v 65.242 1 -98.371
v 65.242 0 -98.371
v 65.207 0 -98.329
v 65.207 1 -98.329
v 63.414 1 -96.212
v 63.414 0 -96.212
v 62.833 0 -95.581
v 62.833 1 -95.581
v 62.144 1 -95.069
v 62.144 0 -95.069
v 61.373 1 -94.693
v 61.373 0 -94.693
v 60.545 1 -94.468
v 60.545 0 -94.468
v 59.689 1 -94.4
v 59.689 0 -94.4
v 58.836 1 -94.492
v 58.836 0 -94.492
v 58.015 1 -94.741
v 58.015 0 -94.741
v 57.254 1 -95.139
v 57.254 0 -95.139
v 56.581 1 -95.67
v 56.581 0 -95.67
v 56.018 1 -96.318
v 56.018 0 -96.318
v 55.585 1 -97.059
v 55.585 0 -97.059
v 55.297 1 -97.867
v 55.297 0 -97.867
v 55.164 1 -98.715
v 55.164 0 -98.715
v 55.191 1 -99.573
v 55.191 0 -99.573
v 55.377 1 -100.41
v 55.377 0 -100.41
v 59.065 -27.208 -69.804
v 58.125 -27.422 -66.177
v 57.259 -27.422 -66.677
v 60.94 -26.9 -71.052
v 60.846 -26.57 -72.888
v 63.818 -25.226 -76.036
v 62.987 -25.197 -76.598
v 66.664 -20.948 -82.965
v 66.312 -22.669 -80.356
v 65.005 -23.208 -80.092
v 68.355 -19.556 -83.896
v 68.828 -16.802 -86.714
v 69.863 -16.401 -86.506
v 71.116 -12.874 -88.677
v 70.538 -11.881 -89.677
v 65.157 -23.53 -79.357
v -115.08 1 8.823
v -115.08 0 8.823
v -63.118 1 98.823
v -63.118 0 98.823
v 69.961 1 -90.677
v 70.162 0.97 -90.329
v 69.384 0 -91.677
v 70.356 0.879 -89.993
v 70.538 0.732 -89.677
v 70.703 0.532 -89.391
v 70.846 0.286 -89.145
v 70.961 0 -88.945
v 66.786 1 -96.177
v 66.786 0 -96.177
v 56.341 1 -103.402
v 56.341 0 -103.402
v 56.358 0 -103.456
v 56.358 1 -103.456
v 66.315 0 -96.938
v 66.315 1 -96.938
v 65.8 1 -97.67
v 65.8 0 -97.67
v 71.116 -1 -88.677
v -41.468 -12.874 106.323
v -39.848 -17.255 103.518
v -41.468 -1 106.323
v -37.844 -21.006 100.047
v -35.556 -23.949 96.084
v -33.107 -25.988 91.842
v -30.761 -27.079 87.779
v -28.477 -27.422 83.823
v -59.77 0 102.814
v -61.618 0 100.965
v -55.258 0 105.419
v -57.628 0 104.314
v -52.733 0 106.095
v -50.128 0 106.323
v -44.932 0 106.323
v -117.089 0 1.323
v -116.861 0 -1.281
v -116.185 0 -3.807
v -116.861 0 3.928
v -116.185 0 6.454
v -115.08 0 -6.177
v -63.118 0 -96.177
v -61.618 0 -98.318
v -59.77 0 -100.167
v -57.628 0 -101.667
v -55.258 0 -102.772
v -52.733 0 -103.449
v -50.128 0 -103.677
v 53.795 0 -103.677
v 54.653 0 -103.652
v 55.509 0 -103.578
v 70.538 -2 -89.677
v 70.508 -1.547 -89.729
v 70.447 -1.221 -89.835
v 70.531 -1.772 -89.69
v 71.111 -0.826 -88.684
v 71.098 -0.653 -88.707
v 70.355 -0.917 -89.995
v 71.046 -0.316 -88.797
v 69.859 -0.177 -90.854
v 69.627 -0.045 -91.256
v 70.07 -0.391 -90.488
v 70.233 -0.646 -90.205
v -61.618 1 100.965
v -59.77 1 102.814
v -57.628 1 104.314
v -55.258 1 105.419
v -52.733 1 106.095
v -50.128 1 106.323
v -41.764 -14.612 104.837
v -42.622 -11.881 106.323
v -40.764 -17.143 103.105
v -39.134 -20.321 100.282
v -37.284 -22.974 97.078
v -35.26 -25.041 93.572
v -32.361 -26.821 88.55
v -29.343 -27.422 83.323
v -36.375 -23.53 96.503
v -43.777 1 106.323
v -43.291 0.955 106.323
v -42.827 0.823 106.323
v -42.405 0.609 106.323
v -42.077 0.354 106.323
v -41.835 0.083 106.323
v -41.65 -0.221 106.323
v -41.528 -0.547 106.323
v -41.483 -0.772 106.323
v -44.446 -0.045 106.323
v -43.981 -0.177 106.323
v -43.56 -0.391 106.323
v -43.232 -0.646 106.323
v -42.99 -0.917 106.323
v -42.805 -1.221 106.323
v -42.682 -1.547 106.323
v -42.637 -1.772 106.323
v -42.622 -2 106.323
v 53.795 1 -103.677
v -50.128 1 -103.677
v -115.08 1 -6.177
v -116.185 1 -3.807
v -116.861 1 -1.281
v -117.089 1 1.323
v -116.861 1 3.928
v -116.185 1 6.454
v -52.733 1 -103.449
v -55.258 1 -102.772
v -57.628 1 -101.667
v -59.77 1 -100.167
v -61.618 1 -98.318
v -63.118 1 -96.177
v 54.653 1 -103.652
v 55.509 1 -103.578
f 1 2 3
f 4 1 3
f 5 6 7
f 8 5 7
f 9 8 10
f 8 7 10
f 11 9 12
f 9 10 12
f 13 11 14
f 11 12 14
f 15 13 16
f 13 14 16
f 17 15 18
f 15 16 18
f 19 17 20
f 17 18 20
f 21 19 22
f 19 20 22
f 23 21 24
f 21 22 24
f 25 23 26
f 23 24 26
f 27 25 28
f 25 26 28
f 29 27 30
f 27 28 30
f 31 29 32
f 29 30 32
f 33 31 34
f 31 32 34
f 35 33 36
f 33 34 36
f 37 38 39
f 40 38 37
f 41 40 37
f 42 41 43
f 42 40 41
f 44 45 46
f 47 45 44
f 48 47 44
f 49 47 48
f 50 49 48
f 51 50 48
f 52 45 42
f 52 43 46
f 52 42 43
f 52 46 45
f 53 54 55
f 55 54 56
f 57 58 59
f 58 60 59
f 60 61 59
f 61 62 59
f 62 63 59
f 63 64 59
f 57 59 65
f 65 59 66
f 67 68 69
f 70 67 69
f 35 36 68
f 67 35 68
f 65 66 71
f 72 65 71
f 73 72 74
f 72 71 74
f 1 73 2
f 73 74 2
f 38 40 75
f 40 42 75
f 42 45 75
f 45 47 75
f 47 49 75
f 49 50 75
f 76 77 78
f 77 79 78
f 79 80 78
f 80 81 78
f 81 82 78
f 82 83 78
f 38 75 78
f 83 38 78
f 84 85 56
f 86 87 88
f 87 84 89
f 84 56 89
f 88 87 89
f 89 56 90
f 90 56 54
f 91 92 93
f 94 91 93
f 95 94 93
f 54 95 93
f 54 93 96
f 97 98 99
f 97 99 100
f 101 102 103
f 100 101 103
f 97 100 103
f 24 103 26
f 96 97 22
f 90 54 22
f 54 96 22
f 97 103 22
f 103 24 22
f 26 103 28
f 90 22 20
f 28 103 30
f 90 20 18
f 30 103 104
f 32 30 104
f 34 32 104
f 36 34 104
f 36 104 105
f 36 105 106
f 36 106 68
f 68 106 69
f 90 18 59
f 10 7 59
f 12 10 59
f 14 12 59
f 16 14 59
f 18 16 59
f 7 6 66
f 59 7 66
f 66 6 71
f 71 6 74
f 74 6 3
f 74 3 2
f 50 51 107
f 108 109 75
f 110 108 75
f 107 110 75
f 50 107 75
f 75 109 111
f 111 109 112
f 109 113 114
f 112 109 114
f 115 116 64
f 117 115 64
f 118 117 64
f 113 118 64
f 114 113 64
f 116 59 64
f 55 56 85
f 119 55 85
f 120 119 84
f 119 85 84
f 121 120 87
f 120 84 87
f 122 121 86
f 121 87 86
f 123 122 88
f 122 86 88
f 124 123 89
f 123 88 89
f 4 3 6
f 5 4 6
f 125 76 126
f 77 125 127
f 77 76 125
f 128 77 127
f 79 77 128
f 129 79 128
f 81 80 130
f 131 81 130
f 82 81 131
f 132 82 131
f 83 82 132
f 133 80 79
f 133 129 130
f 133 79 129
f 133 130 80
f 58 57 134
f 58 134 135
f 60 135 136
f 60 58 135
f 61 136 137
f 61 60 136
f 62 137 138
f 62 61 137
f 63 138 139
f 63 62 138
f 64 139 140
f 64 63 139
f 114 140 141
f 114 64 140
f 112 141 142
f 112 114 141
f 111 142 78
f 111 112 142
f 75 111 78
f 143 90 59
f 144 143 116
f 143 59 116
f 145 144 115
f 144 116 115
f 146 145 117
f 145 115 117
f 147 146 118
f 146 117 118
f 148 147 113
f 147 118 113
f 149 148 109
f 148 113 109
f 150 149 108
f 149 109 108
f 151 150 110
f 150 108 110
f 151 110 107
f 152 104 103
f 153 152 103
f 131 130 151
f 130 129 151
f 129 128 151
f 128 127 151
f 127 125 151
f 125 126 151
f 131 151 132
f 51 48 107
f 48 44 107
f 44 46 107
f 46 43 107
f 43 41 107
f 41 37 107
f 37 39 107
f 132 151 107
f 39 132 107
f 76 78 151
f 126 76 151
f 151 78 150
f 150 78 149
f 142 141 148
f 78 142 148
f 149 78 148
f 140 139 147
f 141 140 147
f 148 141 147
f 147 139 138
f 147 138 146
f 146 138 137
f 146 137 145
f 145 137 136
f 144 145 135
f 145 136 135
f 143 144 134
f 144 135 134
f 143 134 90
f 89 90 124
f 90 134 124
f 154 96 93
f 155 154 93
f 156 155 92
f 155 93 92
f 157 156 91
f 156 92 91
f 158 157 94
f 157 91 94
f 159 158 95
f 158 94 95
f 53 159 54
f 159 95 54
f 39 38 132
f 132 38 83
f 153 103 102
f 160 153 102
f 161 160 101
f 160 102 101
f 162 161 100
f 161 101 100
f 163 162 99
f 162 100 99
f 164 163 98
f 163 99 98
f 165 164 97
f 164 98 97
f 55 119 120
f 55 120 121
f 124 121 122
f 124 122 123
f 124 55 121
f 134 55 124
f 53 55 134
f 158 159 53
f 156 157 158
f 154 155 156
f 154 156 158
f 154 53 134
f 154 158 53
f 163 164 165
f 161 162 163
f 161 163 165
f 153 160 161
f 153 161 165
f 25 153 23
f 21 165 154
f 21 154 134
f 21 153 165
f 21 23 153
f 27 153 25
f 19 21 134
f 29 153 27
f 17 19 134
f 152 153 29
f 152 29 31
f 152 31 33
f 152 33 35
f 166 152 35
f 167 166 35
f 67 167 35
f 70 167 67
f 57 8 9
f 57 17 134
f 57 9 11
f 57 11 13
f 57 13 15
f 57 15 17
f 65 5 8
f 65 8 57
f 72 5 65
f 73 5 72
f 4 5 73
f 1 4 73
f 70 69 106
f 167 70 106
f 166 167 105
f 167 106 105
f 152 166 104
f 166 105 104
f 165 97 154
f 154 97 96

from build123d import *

# Parameters (mm, degrees)
SALIENTE_EXTRUIR1_DEPTH = 1
SALIENTE_EXTRUIR2_DEPTH = 27.5
REDONDEO1_R             = 2
CORTAR_EXTRUIR1_DEPTH   = 3


with BuildPart() as part:
    # Croquis1 → Saliente-Extruir1 (new body)
    with BuildSketch(Plane(origin=(0, 0, 0), x_dir=(1, 0, 0), z_dir=(0, 1, 0))):
        with BuildLine():
            Line((-115.079714212, -8.823380035), (-63.118189984, -98.823380035))
            ThreePointArc((-63.118189984, -98.823380035), (-57.627808928, -104.313761092), (-50.127808928, -106.323380035))
            Line((-50.127808928, -106.323380035), (-41.46755489, -106.323380035))
            Line((-41.46755489, -106.323380035), (71.115747602, 88.676619965))
            Line((71.115747602, 88.676619965), (66.785620583, 96.176619965))
            ThreePointArc((66.785620583, 96.176619965), (66.062943429, 97.308157543), (65.241980727, 98.37054156))
            Line((65.241980727, 98.37054156), (65.207007249, 98.329234857))
            Line((65.207007249, 98.329234857), (63.414251951, 96.211835777))
            ThreePointArc((63.414251951, 96.211835777), (57.625242859, 94.922266282), (55.376892454, 100.410484227))
            Line((55.376892454, 100.410484227), (56.341107438, 103.402342517))
            Line((56.341107438, 103.402342517), (56.358401529, 103.456004274))
            ThreePointArc((56.358401529, 103.456004274), (55.08155896, 103.621364269), (53.795239526, 103.676619965))
            Line((53.795239526, 103.676619965), (-50.127808928, 103.676619965))
            ThreePointArc((-50.127808928, 103.676619965), (-57.627808928, 101.667001022), (-63.118189984, 96.176619965))
            Line((-63.118189984, 96.176619965), (-115.079714212, 6.176619965))
            ThreePointArc((-115.079714212, 6.176619965), (-117.089333155, -1.323380035), (-115.079714212, -8.823380035))
        make_face()
    extrude(amount=SALIENTE_EXTRUIR1_DEPTH)

    # Croquis2 → Saliente-Extruir2 (add)
    with BuildSketch(Plane.XZ):
        Polygon((70.538397333, -89.676619965), (71.115747602, -88.676619965), (-41.46755489, 106.323380035), (-42.622255428, 106.323380035), align=None)
    extrude(amount=SALIENTE_EXTRUIR2_DEPTH)

    # Redondeo1
    redondeo1_edges = [part.edges().sort_by_distance(p)[0] for p in [
        (13.958070952, 0, 8.323380035),
        (14.824096356, 1, 8.823380035),
    ]]
    fillet(redondeo1_edges, radius=REDONDEO1_R)

    # Croquis3 → Cortar-Extruir1 (cut)
    with BuildSketch(Plane(origin=(14.938707896, 0, 8.624867025), x_dir=(0.49999999999999983, 0, -0.8660254037844387), z_dir=(0.8660254037844387, 0, 0.49999999999999983))):
        with BuildLine():
            Line((-117.14265259, 2.577906999), (-128.509159891, -12.943048078))
            Line((-128.509159891, -12.943048078), (-113.226187721, -43.828381759))
            Line((-113.226187721, -43.828381759), (121.292947467, -43.828381759))
            Line((121.292947467, -43.828381759), (140.229409901, -2.708549898))
            Line((140.229409901, -2.708549898), (116.684206431, 2.577906999))
            add(Edge.make_bspline(
                [(86.373317299, -27.422093001), (116.684206431, -27.422093001), (116.684206431, 2.577906999)],
                knots=[1.570796327, 1.570796327, 1.570796327, 3.141592654, 3.141592654, 3.141592654], degree=2, weights=[1, 0.707106781, 1]))
            Line((86.373317299, -27.422093001), (-86.831763458, -27.422093001))
            add(Edge.make_bspline(
                [(-117.14265259, 2.577906999), (-117.14265259, -27.422093001), (-86.831763458, -27.422093001)],
                knots=[3.141592654, 3.141592654, 3.141592654, 4.71238898, 4.71238898, 4.71238898], degree=2, weights=[1, 0.707106781, 1]))
        make_face()
    extrude(amount=-CORTAR_EXTRUIR1_DEPTH, mode=Mode.SUBTRACT)


solid = part.part
